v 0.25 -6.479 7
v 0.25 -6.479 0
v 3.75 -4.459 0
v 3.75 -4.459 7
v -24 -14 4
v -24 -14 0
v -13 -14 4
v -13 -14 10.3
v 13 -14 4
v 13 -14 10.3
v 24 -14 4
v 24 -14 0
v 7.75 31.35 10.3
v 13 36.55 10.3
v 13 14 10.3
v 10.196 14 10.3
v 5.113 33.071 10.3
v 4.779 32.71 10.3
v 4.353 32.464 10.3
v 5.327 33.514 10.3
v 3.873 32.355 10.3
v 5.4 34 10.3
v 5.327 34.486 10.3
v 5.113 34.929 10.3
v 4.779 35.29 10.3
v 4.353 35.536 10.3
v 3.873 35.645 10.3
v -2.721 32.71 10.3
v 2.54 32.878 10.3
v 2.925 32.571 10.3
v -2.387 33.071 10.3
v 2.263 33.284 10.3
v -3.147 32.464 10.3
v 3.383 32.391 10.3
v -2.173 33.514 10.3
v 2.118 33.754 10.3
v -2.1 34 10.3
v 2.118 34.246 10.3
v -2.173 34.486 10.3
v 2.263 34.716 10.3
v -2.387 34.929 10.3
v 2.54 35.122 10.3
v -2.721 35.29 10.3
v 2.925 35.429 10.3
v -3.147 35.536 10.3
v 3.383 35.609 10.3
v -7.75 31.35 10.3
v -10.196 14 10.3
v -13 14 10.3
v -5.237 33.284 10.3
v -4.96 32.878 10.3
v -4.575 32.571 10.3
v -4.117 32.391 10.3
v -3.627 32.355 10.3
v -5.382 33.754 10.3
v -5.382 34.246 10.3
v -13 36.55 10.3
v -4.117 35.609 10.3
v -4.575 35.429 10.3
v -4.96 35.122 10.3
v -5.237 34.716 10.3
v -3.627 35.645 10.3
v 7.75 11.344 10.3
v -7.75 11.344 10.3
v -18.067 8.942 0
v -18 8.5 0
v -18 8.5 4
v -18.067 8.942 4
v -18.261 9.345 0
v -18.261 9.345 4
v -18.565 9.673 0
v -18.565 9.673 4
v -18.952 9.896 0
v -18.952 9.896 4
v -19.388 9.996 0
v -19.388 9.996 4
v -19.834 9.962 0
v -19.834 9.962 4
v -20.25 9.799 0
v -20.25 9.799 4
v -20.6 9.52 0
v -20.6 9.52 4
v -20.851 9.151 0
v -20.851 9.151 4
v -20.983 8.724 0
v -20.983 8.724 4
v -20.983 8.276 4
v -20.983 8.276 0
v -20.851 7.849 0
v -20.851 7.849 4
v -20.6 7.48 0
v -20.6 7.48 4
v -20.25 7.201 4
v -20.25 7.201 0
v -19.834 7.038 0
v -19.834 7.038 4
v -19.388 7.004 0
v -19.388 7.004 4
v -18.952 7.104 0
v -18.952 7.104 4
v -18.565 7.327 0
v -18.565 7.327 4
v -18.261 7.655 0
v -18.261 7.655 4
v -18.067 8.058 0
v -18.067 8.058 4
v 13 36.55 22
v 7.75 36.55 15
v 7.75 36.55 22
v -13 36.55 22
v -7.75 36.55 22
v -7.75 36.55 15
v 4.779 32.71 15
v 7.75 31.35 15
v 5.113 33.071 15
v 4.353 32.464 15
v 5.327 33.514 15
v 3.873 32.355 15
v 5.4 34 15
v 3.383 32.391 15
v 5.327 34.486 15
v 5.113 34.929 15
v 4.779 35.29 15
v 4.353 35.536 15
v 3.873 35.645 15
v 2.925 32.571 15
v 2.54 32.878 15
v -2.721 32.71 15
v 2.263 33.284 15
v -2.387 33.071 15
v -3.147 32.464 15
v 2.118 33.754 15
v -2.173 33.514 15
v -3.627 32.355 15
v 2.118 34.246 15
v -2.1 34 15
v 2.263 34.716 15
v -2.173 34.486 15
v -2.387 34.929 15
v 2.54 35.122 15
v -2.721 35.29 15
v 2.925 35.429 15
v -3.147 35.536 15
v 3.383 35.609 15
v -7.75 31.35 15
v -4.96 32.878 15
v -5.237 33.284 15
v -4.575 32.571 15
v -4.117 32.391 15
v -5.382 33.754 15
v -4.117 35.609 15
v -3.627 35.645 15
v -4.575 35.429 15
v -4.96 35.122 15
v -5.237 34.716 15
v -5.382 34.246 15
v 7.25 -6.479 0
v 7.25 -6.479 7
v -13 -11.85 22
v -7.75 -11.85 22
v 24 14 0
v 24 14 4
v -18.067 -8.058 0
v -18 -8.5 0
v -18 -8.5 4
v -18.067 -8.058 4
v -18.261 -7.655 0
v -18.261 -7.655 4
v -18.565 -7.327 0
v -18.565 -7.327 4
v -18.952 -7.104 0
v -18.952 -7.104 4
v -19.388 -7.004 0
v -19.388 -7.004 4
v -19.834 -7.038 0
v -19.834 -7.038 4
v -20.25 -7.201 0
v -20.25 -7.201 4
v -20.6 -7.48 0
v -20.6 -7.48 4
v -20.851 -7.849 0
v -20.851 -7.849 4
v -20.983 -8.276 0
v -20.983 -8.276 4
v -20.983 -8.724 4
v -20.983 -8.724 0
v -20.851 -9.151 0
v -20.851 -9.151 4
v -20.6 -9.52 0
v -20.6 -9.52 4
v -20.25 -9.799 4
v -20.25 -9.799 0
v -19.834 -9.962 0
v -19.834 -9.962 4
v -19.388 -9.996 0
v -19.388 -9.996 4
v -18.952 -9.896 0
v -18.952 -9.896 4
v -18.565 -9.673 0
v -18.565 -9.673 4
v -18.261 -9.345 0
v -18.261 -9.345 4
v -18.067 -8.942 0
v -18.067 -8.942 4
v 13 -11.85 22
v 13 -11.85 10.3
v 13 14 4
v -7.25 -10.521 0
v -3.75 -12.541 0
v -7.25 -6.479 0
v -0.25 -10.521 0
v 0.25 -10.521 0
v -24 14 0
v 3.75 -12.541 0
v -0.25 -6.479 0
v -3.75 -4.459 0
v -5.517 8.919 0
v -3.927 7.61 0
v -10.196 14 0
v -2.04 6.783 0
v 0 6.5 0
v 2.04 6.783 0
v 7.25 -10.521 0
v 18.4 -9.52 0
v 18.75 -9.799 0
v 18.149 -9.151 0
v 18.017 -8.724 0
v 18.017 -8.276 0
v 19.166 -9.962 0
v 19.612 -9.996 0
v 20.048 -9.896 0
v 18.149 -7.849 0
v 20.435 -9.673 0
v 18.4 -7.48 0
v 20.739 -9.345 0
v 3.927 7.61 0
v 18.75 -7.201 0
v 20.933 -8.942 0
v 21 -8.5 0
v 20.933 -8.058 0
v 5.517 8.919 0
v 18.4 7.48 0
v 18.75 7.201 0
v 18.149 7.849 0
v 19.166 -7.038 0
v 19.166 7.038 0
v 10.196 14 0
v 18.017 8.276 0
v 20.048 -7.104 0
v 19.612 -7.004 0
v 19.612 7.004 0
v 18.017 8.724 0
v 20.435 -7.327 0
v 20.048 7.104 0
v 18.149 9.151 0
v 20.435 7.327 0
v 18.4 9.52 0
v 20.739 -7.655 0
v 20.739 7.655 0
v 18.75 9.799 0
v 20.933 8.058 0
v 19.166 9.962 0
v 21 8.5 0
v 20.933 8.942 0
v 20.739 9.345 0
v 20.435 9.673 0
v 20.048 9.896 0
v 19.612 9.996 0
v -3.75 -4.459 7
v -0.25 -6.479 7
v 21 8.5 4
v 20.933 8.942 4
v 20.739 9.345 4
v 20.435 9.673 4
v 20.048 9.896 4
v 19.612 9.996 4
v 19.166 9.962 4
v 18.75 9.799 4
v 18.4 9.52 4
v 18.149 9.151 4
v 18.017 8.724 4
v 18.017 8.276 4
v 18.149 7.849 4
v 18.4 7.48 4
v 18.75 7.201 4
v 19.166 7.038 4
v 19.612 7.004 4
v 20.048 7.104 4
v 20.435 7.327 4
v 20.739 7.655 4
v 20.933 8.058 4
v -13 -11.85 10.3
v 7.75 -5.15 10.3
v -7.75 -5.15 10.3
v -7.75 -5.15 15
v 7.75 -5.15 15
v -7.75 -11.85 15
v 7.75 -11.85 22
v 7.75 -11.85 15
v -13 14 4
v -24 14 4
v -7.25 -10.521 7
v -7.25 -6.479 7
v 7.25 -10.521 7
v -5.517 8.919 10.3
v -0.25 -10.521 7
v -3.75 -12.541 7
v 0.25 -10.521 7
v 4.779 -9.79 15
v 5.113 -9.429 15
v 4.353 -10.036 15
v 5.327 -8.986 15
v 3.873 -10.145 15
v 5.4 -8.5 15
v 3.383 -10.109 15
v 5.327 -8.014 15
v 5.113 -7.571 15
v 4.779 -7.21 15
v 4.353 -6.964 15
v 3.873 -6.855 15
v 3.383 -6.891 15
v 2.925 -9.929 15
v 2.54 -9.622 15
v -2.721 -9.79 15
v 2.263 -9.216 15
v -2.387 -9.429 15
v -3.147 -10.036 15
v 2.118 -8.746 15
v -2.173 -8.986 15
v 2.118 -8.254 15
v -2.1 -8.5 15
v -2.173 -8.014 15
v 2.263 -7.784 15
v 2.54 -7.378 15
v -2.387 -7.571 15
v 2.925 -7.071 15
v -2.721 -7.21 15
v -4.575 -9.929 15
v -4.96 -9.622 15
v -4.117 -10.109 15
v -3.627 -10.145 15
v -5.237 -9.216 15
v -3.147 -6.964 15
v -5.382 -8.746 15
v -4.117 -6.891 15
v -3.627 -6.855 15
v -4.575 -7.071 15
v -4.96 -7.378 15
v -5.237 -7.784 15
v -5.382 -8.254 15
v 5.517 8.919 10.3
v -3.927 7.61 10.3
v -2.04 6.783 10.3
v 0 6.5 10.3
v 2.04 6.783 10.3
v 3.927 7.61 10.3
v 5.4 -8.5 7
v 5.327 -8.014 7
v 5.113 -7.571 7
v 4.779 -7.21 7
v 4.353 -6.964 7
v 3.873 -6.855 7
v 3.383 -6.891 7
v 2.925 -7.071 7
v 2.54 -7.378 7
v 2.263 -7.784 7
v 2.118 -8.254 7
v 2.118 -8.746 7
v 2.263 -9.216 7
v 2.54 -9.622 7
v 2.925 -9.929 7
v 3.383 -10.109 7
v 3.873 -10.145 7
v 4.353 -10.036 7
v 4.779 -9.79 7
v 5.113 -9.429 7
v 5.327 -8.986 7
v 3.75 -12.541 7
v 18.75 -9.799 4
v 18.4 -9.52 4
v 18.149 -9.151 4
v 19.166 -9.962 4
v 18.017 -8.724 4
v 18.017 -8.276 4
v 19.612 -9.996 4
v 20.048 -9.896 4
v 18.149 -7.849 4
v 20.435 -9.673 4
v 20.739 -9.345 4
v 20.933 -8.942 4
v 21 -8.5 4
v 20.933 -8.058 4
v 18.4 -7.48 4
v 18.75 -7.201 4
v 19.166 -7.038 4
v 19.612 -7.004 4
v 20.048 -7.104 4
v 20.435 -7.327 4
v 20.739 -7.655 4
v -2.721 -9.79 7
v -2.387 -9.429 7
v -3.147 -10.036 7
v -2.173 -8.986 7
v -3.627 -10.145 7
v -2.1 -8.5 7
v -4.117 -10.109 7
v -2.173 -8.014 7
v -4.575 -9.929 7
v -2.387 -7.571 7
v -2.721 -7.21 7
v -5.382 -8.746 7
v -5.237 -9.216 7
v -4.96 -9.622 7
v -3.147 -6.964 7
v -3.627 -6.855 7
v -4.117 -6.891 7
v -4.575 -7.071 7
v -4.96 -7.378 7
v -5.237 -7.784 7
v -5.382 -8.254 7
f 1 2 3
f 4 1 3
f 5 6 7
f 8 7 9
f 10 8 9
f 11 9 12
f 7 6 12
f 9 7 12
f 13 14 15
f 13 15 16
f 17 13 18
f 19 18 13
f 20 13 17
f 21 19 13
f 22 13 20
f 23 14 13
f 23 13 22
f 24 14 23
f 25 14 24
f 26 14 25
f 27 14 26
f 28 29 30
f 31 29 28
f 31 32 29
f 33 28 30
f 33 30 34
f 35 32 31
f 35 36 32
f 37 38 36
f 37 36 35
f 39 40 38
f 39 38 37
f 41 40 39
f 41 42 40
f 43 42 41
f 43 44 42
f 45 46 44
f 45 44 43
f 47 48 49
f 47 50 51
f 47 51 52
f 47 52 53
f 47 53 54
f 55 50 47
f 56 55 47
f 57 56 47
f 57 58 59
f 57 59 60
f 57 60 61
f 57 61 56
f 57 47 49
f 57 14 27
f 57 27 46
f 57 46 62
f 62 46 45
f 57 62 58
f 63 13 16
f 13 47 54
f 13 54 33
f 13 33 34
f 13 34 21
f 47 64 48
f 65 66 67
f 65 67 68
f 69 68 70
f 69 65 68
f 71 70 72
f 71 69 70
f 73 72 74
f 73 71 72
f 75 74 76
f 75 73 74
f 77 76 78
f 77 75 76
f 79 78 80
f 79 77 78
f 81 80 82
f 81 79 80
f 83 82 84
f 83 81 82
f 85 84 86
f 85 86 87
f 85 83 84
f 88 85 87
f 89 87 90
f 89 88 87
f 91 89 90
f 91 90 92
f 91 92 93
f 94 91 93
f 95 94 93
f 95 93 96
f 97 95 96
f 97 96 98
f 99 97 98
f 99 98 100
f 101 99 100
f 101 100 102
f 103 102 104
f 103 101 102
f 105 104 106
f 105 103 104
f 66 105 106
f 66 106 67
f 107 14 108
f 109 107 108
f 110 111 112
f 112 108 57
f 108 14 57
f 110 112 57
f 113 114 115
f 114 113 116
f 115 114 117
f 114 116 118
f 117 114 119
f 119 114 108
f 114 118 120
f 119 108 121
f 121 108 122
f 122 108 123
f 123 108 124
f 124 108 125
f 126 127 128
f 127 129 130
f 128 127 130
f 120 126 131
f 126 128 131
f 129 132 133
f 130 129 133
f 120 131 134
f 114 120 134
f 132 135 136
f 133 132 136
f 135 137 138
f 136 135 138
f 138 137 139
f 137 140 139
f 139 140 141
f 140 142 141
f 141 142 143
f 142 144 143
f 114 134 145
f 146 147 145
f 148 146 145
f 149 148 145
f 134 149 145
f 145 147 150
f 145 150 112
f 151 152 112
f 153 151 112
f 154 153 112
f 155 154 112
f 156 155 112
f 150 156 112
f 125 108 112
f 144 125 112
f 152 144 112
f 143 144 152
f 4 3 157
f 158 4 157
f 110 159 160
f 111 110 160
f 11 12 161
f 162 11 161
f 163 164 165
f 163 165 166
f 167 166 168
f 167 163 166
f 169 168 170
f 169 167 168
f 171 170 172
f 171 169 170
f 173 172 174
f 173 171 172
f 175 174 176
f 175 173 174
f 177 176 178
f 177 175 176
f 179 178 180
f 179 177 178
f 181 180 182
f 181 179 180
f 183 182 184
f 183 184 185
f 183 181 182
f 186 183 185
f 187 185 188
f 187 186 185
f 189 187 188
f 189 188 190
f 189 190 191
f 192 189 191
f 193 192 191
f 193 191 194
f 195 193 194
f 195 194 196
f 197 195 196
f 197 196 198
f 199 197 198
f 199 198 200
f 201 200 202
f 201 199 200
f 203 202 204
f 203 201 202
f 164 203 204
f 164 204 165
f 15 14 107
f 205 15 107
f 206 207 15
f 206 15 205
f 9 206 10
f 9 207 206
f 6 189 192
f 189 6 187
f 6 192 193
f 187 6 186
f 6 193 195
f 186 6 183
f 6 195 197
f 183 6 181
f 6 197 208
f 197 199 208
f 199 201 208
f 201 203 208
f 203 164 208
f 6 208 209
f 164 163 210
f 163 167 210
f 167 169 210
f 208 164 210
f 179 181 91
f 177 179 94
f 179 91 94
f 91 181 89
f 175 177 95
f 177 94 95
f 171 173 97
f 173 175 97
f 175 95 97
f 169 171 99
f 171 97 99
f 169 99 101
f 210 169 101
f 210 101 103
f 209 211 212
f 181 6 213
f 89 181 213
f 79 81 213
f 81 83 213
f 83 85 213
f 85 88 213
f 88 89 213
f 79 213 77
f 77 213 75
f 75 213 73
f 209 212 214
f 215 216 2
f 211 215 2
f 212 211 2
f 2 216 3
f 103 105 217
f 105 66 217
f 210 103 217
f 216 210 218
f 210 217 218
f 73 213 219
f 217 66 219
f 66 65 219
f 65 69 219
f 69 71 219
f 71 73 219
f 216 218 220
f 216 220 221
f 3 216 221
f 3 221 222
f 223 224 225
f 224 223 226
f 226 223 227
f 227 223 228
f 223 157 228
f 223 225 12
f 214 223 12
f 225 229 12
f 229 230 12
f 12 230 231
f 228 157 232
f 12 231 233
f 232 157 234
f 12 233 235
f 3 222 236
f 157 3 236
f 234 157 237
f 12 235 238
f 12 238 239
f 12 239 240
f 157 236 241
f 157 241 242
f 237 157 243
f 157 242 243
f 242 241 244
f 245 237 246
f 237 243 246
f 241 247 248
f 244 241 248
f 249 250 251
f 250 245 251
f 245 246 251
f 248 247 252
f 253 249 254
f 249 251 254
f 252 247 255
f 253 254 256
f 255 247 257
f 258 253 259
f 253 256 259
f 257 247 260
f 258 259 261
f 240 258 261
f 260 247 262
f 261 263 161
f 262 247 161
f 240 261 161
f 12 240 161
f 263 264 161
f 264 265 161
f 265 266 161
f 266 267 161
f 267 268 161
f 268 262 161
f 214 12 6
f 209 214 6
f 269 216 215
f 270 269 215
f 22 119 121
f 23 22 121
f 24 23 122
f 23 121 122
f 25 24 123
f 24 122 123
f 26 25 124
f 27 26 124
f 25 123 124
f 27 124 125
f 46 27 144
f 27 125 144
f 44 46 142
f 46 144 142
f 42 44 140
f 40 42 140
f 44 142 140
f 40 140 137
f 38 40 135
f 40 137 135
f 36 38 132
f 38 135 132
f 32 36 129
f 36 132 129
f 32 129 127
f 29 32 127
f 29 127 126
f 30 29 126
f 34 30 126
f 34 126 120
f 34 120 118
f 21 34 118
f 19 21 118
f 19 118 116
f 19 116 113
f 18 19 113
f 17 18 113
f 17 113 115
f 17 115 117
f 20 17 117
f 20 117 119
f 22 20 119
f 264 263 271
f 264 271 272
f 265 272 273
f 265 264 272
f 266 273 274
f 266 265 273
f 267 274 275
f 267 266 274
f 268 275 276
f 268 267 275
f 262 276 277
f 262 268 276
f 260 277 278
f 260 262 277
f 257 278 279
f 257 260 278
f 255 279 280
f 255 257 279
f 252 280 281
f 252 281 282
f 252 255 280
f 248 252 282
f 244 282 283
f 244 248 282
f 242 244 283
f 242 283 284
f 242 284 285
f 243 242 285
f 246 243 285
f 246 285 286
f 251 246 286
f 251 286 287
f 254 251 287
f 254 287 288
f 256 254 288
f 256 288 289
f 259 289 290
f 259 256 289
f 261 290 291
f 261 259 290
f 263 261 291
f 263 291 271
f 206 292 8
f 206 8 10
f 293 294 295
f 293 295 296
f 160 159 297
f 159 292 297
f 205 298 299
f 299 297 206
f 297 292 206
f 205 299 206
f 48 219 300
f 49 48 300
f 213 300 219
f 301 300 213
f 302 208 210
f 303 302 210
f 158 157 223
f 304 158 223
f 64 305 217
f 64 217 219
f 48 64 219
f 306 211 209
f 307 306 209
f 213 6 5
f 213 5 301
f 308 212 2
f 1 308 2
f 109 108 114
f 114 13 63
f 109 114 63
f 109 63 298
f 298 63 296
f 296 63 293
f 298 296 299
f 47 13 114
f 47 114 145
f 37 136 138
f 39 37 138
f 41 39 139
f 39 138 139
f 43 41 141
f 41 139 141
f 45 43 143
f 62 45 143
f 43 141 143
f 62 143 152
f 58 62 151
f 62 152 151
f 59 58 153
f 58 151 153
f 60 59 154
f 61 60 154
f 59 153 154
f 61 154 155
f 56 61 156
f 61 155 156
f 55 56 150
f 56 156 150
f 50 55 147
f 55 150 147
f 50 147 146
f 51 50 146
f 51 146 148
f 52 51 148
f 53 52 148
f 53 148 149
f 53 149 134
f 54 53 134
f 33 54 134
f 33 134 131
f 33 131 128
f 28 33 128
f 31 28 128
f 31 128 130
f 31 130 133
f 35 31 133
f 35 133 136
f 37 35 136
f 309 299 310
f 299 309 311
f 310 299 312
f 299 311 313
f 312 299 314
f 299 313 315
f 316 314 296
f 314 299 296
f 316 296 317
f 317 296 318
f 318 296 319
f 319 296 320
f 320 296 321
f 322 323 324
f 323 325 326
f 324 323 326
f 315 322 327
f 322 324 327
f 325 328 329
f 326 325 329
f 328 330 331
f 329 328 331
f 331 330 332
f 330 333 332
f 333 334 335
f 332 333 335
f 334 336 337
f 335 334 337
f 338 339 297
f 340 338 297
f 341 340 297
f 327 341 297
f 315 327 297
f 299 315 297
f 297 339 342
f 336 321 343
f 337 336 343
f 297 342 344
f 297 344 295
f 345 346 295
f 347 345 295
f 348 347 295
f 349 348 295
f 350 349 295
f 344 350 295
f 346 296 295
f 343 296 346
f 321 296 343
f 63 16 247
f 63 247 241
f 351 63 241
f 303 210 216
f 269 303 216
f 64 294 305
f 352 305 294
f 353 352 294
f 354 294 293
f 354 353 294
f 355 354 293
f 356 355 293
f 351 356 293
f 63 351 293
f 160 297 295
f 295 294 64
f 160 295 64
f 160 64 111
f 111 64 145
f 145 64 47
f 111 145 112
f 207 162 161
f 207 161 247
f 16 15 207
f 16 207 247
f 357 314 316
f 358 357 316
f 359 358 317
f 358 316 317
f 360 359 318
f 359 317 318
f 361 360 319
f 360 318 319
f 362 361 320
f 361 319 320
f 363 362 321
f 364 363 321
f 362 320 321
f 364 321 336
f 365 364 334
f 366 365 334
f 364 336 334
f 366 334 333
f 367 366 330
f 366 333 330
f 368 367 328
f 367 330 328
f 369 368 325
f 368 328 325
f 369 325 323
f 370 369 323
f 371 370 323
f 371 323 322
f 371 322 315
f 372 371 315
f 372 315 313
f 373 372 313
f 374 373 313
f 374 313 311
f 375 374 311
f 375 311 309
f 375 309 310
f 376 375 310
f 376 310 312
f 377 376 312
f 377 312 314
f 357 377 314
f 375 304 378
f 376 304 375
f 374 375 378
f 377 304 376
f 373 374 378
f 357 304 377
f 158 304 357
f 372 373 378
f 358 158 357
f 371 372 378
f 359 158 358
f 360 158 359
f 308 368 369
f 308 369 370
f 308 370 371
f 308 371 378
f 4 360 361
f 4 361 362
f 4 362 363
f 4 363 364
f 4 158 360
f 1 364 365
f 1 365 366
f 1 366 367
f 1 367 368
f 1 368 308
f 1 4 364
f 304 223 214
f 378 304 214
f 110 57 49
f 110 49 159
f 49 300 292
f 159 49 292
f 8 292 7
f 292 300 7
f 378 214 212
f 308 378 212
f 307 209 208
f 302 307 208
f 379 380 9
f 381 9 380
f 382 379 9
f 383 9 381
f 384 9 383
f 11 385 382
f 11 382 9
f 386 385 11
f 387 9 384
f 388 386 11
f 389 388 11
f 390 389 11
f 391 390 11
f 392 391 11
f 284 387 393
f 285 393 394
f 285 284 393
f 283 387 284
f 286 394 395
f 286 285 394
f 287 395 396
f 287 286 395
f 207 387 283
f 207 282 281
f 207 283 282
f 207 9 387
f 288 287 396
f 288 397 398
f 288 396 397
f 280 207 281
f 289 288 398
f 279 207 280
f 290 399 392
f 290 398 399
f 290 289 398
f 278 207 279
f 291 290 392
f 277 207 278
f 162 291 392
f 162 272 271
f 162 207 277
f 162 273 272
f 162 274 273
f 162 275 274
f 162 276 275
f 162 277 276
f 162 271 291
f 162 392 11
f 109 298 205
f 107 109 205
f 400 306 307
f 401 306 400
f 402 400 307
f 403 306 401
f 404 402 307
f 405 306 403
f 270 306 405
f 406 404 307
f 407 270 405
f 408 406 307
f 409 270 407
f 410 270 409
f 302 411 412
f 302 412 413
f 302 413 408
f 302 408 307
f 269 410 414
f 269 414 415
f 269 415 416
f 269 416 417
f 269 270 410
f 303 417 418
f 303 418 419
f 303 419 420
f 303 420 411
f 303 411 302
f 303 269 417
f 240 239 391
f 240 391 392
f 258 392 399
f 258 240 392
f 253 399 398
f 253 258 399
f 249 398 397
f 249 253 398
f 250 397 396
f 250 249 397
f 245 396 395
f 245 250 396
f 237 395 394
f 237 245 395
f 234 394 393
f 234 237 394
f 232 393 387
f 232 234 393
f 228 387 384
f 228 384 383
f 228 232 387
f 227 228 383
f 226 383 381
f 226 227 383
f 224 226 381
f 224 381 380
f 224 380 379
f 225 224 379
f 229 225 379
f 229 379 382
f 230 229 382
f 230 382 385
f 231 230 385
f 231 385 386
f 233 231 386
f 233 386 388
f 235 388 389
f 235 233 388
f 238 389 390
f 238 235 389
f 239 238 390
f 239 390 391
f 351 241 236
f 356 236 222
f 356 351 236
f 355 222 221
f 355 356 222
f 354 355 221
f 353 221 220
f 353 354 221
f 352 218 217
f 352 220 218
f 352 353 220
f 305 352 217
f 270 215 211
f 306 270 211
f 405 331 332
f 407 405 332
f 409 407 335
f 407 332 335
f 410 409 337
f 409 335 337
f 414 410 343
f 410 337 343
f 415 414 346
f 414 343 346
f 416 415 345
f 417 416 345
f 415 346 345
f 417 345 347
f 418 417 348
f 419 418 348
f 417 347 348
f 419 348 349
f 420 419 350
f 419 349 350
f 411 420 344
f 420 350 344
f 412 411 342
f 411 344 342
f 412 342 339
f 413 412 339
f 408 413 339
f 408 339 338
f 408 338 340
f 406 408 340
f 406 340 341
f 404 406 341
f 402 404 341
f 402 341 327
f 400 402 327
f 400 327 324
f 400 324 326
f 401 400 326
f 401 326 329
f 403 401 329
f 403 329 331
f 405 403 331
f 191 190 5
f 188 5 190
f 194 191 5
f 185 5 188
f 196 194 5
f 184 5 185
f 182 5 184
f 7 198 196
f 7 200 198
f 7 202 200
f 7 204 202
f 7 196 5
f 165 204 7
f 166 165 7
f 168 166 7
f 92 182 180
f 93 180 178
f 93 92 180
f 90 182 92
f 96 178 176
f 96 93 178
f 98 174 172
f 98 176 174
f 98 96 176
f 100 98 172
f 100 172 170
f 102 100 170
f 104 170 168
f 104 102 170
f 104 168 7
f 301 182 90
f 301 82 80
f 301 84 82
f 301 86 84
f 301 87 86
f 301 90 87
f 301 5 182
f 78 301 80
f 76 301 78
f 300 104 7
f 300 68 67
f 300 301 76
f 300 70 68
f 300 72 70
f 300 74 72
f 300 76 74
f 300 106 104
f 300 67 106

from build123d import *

# Parameters (mm, degrees)
SZKIC1_W                    = 48
SZKIC1_H                    = 28
SZKIC1_R                    = 1.5
DODANIE_WYCI_GNI_CIE1_DEPTH = 4
WYTNIJ_WYCI_GNI_CIE1_DEPTH  = 4
SZKIC3_W                    = 26
SZKIC3_H                    = 6.7
DODANIE_WYCI_GNI_CIE2_DEPTH = 11
DODANIE_WYCI_GNI_CIE3_START = 6.3
DODANIE_WYCI_GNI_CIE3_DEPTH = 6.3
SZKIC5_W                    = 26
SZKIC5_H                    = 2.15
DODANIE_WYCI_GNI_CIE4_DEPTH = 6.3
DODANIE_WYCI_GNI_CIE7_DEPTH = 4.7
WYTNIJ_WYCI_GNI_CIE2_REACH  = 48.227
SZKIC10_R                   = 1.65
DODANIE_WYCI_GNI_CIE8_DEPTH = 7
WYTNIJ_WYCI_GNI_CIE3_DEPTH  = 7


with BuildPart() as part:
    # Szkic1 → Dodanie-wyciągnięcie1 (new body)
    with BuildSketch(Plane.XY):
        Rectangle(SZKIC1_W, SZKIC1_H)
        with Locations((-19.5, 8.5)):
            Circle(SZKIC1_R, mode=Mode.SUBTRACT)
        with Locations((-19.5, -8.5)):
            Circle(SZKIC1_R, mode=Mode.SUBTRACT)
        with Locations((19.5, -8.5)):
            Circle(SZKIC1_R, mode=Mode.SUBTRACT)
        with Locations((19.5, 8.5)):
            Circle(SZKIC1_R, mode=Mode.SUBTRACT)
    extrude(amount=DODANIE_WYCI_GNI_CIE1_DEPTH)

    # Szkic2 → Wytnij-wyciągnięcie1 (cut)
    with BuildSketch(Plane.XY.offset(4)):
        with BuildLine():
            Line((5.516782951, 8.919143195), (10.1961597, 14))
            Line((10.1961597, 14), (-10.1961597, 14))
            Line((-10.1961597, 14), (-5.516782951, 8.919143195))
            ThreePointArc((-5.516782951, 8.919143195), (0, 6.5), (5.516782951, 8.919143195))
        make_face()
    extrude(amount=-WYTNIJ_WYCI_GNI_CIE1_DEPTH, mode=Mode.SUBTRACT)

    # Szkic3 → Dodanie-wyciągnięcie2 (add)
    with BuildSketch(Plane.XY.offset(4)):
        with Locations((0, -8.5)):
            Rectangle(SZKIC3_W, SZKIC3_H)
    extrude(amount=DODANIE_WYCI_GNI_CIE2_DEPTH)

    # Szkic4 → Dodanie-wyciągnięcie3 (add)
    with BuildSketch(Plane.XY.offset(4).offset(DODANIE_WYCI_GNI_CIE3_START)):
        with BuildLine():
            Line((-13, -5.15), (13, -5.15))
            Line((13, -5.15), (13, 14))
            Line((13, 14), (10.1961597, 14))
            Line((10.1961597, 14), (5.516782951, 8.919143195))
            ThreePointArc((5.516782951, 8.919143195), (0, 6.5), (-5.516782951, 8.919143195))
            Line((-5.516782951, 8.919143195), (-10.1961597, 14))
            Line((-10.1961597, 14), (-13, 14))
            Line((-13, 14), (-13, -5.15))
        make_face()
    extrude(amount=-DODANIE_WYCI_GNI_CIE3_DEPTH)

    # Szkic5 → Dodanie-wyciągnięcie4 (add)
    with BuildSketch(Plane.XY.offset(4)):
        with Locations((0, -12.925)):
            Rectangle(SZKIC5_W, SZKIC5_H)
    extrude(amount=DODANIE_WYCI_GNI_CIE4_DEPTH)

    # Szkic9 → Dodanie-wyciągnięcie7 (add)
    with BuildSketch(Plane.XY.offset(10.3)):
        Polygon((-13, -5.15), (-13, 36.55), (13, 36.55), (13, -5.15), (7.75, -5.15), (7.75, 31.35), (-7.75, 31.35), (-7.75, -5.15), align=None)
    extrude(amount=DODANIE_WYCI_GNI_CIE7_DEPTH)

    # Wytnij-wyciągnięcie2: up to this face of the body (flat: up to its plane)
    wytnij_wyci_gni_cie2_end = Plane(part.part.faces().sort_by_distance((0, -0.888373191, 0))[0])
    # Szkic10 → Wytnij-wyciągnięcie2 (cut, up to the picked face)
    with BuildSketch(Plane.XY.offset(15), mode=Mode.PRIVATE) as wytnij_wyci_gni_cie2_sk1:
        with Locations((-3.75, -8.5)):
            Circle(SZKIC10_R)
    wytnij_wyci_gni_cie2_tool1 = split(extrude(wytnij_wyci_gni_cie2_sk1.sketch, amount=-WYTNIJ_WYCI_GNI_CIE2_REACH, mode=Mode.PRIVATE), bisect_by=wytnij_wyci_gni_cie2_end, keep=Keep.BOTH, mode=Mode.PRIVATE)
    # Szkic10 → Wytnij-wyciągnięcie2 (cut, up to the picked face)
    with BuildSketch(Plane.XY.offset(15), mode=Mode.PRIVATE) as wytnij_wyci_gni_cie2_sk2:
        with Locations((3.75, -8.5)):
            Circle(SZKIC10_R)
    wytnij_wyci_gni_cie2_tool2 = split(extrude(wytnij_wyci_gni_cie2_sk2.sketch, amount=-WYTNIJ_WYCI_GNI_CIE2_REACH, mode=Mode.PRIVATE), bisect_by=wytnij_wyci_gni_cie2_end, keep=Keep.BOTH, mode=Mode.PRIVATE)
    # Szkic10 → Wytnij-wyciągnięcie2 (cut, up to the picked face)
    with BuildSketch(Plane.XY.offset(15), mode=Mode.PRIVATE) as wytnij_wyci_gni_cie2_sk3:
        with Locations((-3.75, 34)):
            Circle(SZKIC10_R)
    wytnij_wyci_gni_cie2_tool3 = split(extrude(wytnij_wyci_gni_cie2_sk3.sketch, amount=-WYTNIJ_WYCI_GNI_CIE2_REACH, mode=Mode.PRIVATE), bisect_by=wytnij_wyci_gni_cie2_end, keep=Keep.BOTH, mode=Mode.PRIVATE)
    # Szkic10 → Wytnij-wyciągnięcie2 (cut, up to the picked face)
    with BuildSketch(Plane.XY.offset(15), mode=Mode.PRIVATE) as wytnij_wyci_gni_cie2_sk4:
        with Locations((3.75, 34)):
            Circle(SZKIC10_R)
    wytnij_wyci_gni_cie2_tool4 = split(extrude(wytnij_wyci_gni_cie2_sk4.sketch, amount=-WYTNIJ_WYCI_GNI_CIE2_REACH, mode=Mode.PRIVATE), bisect_by=wytnij_wyci_gni_cie2_end, keep=Keep.BOTH, mode=Mode.PRIVATE)
    add(wytnij_wyci_gni_cie2_tool1.solids().sort_by(Axis((-3.75, -8.5, 15), (0, 0, -1)))[0], mode=Mode.SUBTRACT)
    add(wytnij_wyci_gni_cie2_tool2.solids().sort_by(Axis((3.75, -8.5, 15), (0, 0, -1)))[0], mode=Mode.SUBTRACT)
    add(wytnij_wyci_gni_cie2_tool3.solids().sort_by(Axis((-3.75, 34, 15), (0, 0, -1)))[0], mode=Mode.SUBTRACT)
    add(wytnij_wyci_gni_cie2_tool4.solids().sort_by(Axis((3.75, 34, 15), (0, 0, -1)))[0], mode=Mode.SUBTRACT)

    # Szkic12 → Dodanie-wyciągnięcie8 (add)
    with BuildSketch(Plane.XY.offset(15)):
        Polygon((-7.75, 36.55), (-13, 36.55), (-13, -11.85), (-7.75, -11.85), (-7.75, -5.15), (-7.75, 31.35), align=None)
        Polygon((13, 36.55), (7.75, 36.55), (7.75, 31.35), (7.75, -5.15), (7.75, -11.85), (13, -11.85), align=None)
    extrude(amount=DODANIE_WYCI_GNI_CIE8_DEPTH)

    # Szkic14 → Wytnij-wyciągnięcie3 (cut)
    with BuildSketch(Plane(origin=(0, 0, 0), x_dir=(-1, 0, 0), z_dir=(0, 0, -1))):
        Polygon((-3.75, -4.458548116), (-7.25, -6.479274058), (-7.25, -10.520725942), (-3.75, -12.541451884), (-0.25, -10.520725942), (-0.25, -6.479274058), align=None)
        Polygon((3.75, -4.458548116), (0.25, -6.479274058), (0.25, -10.520725942), (3.75, -12.541451884), (7.25, -10.520725942), (7.25, -6.479274058), align=None)
    extrude(amount=-WYTNIJ_WYCI_GNI_CIE3_DEPTH, mode=Mode.SUBTRACT)


solid = part.part
